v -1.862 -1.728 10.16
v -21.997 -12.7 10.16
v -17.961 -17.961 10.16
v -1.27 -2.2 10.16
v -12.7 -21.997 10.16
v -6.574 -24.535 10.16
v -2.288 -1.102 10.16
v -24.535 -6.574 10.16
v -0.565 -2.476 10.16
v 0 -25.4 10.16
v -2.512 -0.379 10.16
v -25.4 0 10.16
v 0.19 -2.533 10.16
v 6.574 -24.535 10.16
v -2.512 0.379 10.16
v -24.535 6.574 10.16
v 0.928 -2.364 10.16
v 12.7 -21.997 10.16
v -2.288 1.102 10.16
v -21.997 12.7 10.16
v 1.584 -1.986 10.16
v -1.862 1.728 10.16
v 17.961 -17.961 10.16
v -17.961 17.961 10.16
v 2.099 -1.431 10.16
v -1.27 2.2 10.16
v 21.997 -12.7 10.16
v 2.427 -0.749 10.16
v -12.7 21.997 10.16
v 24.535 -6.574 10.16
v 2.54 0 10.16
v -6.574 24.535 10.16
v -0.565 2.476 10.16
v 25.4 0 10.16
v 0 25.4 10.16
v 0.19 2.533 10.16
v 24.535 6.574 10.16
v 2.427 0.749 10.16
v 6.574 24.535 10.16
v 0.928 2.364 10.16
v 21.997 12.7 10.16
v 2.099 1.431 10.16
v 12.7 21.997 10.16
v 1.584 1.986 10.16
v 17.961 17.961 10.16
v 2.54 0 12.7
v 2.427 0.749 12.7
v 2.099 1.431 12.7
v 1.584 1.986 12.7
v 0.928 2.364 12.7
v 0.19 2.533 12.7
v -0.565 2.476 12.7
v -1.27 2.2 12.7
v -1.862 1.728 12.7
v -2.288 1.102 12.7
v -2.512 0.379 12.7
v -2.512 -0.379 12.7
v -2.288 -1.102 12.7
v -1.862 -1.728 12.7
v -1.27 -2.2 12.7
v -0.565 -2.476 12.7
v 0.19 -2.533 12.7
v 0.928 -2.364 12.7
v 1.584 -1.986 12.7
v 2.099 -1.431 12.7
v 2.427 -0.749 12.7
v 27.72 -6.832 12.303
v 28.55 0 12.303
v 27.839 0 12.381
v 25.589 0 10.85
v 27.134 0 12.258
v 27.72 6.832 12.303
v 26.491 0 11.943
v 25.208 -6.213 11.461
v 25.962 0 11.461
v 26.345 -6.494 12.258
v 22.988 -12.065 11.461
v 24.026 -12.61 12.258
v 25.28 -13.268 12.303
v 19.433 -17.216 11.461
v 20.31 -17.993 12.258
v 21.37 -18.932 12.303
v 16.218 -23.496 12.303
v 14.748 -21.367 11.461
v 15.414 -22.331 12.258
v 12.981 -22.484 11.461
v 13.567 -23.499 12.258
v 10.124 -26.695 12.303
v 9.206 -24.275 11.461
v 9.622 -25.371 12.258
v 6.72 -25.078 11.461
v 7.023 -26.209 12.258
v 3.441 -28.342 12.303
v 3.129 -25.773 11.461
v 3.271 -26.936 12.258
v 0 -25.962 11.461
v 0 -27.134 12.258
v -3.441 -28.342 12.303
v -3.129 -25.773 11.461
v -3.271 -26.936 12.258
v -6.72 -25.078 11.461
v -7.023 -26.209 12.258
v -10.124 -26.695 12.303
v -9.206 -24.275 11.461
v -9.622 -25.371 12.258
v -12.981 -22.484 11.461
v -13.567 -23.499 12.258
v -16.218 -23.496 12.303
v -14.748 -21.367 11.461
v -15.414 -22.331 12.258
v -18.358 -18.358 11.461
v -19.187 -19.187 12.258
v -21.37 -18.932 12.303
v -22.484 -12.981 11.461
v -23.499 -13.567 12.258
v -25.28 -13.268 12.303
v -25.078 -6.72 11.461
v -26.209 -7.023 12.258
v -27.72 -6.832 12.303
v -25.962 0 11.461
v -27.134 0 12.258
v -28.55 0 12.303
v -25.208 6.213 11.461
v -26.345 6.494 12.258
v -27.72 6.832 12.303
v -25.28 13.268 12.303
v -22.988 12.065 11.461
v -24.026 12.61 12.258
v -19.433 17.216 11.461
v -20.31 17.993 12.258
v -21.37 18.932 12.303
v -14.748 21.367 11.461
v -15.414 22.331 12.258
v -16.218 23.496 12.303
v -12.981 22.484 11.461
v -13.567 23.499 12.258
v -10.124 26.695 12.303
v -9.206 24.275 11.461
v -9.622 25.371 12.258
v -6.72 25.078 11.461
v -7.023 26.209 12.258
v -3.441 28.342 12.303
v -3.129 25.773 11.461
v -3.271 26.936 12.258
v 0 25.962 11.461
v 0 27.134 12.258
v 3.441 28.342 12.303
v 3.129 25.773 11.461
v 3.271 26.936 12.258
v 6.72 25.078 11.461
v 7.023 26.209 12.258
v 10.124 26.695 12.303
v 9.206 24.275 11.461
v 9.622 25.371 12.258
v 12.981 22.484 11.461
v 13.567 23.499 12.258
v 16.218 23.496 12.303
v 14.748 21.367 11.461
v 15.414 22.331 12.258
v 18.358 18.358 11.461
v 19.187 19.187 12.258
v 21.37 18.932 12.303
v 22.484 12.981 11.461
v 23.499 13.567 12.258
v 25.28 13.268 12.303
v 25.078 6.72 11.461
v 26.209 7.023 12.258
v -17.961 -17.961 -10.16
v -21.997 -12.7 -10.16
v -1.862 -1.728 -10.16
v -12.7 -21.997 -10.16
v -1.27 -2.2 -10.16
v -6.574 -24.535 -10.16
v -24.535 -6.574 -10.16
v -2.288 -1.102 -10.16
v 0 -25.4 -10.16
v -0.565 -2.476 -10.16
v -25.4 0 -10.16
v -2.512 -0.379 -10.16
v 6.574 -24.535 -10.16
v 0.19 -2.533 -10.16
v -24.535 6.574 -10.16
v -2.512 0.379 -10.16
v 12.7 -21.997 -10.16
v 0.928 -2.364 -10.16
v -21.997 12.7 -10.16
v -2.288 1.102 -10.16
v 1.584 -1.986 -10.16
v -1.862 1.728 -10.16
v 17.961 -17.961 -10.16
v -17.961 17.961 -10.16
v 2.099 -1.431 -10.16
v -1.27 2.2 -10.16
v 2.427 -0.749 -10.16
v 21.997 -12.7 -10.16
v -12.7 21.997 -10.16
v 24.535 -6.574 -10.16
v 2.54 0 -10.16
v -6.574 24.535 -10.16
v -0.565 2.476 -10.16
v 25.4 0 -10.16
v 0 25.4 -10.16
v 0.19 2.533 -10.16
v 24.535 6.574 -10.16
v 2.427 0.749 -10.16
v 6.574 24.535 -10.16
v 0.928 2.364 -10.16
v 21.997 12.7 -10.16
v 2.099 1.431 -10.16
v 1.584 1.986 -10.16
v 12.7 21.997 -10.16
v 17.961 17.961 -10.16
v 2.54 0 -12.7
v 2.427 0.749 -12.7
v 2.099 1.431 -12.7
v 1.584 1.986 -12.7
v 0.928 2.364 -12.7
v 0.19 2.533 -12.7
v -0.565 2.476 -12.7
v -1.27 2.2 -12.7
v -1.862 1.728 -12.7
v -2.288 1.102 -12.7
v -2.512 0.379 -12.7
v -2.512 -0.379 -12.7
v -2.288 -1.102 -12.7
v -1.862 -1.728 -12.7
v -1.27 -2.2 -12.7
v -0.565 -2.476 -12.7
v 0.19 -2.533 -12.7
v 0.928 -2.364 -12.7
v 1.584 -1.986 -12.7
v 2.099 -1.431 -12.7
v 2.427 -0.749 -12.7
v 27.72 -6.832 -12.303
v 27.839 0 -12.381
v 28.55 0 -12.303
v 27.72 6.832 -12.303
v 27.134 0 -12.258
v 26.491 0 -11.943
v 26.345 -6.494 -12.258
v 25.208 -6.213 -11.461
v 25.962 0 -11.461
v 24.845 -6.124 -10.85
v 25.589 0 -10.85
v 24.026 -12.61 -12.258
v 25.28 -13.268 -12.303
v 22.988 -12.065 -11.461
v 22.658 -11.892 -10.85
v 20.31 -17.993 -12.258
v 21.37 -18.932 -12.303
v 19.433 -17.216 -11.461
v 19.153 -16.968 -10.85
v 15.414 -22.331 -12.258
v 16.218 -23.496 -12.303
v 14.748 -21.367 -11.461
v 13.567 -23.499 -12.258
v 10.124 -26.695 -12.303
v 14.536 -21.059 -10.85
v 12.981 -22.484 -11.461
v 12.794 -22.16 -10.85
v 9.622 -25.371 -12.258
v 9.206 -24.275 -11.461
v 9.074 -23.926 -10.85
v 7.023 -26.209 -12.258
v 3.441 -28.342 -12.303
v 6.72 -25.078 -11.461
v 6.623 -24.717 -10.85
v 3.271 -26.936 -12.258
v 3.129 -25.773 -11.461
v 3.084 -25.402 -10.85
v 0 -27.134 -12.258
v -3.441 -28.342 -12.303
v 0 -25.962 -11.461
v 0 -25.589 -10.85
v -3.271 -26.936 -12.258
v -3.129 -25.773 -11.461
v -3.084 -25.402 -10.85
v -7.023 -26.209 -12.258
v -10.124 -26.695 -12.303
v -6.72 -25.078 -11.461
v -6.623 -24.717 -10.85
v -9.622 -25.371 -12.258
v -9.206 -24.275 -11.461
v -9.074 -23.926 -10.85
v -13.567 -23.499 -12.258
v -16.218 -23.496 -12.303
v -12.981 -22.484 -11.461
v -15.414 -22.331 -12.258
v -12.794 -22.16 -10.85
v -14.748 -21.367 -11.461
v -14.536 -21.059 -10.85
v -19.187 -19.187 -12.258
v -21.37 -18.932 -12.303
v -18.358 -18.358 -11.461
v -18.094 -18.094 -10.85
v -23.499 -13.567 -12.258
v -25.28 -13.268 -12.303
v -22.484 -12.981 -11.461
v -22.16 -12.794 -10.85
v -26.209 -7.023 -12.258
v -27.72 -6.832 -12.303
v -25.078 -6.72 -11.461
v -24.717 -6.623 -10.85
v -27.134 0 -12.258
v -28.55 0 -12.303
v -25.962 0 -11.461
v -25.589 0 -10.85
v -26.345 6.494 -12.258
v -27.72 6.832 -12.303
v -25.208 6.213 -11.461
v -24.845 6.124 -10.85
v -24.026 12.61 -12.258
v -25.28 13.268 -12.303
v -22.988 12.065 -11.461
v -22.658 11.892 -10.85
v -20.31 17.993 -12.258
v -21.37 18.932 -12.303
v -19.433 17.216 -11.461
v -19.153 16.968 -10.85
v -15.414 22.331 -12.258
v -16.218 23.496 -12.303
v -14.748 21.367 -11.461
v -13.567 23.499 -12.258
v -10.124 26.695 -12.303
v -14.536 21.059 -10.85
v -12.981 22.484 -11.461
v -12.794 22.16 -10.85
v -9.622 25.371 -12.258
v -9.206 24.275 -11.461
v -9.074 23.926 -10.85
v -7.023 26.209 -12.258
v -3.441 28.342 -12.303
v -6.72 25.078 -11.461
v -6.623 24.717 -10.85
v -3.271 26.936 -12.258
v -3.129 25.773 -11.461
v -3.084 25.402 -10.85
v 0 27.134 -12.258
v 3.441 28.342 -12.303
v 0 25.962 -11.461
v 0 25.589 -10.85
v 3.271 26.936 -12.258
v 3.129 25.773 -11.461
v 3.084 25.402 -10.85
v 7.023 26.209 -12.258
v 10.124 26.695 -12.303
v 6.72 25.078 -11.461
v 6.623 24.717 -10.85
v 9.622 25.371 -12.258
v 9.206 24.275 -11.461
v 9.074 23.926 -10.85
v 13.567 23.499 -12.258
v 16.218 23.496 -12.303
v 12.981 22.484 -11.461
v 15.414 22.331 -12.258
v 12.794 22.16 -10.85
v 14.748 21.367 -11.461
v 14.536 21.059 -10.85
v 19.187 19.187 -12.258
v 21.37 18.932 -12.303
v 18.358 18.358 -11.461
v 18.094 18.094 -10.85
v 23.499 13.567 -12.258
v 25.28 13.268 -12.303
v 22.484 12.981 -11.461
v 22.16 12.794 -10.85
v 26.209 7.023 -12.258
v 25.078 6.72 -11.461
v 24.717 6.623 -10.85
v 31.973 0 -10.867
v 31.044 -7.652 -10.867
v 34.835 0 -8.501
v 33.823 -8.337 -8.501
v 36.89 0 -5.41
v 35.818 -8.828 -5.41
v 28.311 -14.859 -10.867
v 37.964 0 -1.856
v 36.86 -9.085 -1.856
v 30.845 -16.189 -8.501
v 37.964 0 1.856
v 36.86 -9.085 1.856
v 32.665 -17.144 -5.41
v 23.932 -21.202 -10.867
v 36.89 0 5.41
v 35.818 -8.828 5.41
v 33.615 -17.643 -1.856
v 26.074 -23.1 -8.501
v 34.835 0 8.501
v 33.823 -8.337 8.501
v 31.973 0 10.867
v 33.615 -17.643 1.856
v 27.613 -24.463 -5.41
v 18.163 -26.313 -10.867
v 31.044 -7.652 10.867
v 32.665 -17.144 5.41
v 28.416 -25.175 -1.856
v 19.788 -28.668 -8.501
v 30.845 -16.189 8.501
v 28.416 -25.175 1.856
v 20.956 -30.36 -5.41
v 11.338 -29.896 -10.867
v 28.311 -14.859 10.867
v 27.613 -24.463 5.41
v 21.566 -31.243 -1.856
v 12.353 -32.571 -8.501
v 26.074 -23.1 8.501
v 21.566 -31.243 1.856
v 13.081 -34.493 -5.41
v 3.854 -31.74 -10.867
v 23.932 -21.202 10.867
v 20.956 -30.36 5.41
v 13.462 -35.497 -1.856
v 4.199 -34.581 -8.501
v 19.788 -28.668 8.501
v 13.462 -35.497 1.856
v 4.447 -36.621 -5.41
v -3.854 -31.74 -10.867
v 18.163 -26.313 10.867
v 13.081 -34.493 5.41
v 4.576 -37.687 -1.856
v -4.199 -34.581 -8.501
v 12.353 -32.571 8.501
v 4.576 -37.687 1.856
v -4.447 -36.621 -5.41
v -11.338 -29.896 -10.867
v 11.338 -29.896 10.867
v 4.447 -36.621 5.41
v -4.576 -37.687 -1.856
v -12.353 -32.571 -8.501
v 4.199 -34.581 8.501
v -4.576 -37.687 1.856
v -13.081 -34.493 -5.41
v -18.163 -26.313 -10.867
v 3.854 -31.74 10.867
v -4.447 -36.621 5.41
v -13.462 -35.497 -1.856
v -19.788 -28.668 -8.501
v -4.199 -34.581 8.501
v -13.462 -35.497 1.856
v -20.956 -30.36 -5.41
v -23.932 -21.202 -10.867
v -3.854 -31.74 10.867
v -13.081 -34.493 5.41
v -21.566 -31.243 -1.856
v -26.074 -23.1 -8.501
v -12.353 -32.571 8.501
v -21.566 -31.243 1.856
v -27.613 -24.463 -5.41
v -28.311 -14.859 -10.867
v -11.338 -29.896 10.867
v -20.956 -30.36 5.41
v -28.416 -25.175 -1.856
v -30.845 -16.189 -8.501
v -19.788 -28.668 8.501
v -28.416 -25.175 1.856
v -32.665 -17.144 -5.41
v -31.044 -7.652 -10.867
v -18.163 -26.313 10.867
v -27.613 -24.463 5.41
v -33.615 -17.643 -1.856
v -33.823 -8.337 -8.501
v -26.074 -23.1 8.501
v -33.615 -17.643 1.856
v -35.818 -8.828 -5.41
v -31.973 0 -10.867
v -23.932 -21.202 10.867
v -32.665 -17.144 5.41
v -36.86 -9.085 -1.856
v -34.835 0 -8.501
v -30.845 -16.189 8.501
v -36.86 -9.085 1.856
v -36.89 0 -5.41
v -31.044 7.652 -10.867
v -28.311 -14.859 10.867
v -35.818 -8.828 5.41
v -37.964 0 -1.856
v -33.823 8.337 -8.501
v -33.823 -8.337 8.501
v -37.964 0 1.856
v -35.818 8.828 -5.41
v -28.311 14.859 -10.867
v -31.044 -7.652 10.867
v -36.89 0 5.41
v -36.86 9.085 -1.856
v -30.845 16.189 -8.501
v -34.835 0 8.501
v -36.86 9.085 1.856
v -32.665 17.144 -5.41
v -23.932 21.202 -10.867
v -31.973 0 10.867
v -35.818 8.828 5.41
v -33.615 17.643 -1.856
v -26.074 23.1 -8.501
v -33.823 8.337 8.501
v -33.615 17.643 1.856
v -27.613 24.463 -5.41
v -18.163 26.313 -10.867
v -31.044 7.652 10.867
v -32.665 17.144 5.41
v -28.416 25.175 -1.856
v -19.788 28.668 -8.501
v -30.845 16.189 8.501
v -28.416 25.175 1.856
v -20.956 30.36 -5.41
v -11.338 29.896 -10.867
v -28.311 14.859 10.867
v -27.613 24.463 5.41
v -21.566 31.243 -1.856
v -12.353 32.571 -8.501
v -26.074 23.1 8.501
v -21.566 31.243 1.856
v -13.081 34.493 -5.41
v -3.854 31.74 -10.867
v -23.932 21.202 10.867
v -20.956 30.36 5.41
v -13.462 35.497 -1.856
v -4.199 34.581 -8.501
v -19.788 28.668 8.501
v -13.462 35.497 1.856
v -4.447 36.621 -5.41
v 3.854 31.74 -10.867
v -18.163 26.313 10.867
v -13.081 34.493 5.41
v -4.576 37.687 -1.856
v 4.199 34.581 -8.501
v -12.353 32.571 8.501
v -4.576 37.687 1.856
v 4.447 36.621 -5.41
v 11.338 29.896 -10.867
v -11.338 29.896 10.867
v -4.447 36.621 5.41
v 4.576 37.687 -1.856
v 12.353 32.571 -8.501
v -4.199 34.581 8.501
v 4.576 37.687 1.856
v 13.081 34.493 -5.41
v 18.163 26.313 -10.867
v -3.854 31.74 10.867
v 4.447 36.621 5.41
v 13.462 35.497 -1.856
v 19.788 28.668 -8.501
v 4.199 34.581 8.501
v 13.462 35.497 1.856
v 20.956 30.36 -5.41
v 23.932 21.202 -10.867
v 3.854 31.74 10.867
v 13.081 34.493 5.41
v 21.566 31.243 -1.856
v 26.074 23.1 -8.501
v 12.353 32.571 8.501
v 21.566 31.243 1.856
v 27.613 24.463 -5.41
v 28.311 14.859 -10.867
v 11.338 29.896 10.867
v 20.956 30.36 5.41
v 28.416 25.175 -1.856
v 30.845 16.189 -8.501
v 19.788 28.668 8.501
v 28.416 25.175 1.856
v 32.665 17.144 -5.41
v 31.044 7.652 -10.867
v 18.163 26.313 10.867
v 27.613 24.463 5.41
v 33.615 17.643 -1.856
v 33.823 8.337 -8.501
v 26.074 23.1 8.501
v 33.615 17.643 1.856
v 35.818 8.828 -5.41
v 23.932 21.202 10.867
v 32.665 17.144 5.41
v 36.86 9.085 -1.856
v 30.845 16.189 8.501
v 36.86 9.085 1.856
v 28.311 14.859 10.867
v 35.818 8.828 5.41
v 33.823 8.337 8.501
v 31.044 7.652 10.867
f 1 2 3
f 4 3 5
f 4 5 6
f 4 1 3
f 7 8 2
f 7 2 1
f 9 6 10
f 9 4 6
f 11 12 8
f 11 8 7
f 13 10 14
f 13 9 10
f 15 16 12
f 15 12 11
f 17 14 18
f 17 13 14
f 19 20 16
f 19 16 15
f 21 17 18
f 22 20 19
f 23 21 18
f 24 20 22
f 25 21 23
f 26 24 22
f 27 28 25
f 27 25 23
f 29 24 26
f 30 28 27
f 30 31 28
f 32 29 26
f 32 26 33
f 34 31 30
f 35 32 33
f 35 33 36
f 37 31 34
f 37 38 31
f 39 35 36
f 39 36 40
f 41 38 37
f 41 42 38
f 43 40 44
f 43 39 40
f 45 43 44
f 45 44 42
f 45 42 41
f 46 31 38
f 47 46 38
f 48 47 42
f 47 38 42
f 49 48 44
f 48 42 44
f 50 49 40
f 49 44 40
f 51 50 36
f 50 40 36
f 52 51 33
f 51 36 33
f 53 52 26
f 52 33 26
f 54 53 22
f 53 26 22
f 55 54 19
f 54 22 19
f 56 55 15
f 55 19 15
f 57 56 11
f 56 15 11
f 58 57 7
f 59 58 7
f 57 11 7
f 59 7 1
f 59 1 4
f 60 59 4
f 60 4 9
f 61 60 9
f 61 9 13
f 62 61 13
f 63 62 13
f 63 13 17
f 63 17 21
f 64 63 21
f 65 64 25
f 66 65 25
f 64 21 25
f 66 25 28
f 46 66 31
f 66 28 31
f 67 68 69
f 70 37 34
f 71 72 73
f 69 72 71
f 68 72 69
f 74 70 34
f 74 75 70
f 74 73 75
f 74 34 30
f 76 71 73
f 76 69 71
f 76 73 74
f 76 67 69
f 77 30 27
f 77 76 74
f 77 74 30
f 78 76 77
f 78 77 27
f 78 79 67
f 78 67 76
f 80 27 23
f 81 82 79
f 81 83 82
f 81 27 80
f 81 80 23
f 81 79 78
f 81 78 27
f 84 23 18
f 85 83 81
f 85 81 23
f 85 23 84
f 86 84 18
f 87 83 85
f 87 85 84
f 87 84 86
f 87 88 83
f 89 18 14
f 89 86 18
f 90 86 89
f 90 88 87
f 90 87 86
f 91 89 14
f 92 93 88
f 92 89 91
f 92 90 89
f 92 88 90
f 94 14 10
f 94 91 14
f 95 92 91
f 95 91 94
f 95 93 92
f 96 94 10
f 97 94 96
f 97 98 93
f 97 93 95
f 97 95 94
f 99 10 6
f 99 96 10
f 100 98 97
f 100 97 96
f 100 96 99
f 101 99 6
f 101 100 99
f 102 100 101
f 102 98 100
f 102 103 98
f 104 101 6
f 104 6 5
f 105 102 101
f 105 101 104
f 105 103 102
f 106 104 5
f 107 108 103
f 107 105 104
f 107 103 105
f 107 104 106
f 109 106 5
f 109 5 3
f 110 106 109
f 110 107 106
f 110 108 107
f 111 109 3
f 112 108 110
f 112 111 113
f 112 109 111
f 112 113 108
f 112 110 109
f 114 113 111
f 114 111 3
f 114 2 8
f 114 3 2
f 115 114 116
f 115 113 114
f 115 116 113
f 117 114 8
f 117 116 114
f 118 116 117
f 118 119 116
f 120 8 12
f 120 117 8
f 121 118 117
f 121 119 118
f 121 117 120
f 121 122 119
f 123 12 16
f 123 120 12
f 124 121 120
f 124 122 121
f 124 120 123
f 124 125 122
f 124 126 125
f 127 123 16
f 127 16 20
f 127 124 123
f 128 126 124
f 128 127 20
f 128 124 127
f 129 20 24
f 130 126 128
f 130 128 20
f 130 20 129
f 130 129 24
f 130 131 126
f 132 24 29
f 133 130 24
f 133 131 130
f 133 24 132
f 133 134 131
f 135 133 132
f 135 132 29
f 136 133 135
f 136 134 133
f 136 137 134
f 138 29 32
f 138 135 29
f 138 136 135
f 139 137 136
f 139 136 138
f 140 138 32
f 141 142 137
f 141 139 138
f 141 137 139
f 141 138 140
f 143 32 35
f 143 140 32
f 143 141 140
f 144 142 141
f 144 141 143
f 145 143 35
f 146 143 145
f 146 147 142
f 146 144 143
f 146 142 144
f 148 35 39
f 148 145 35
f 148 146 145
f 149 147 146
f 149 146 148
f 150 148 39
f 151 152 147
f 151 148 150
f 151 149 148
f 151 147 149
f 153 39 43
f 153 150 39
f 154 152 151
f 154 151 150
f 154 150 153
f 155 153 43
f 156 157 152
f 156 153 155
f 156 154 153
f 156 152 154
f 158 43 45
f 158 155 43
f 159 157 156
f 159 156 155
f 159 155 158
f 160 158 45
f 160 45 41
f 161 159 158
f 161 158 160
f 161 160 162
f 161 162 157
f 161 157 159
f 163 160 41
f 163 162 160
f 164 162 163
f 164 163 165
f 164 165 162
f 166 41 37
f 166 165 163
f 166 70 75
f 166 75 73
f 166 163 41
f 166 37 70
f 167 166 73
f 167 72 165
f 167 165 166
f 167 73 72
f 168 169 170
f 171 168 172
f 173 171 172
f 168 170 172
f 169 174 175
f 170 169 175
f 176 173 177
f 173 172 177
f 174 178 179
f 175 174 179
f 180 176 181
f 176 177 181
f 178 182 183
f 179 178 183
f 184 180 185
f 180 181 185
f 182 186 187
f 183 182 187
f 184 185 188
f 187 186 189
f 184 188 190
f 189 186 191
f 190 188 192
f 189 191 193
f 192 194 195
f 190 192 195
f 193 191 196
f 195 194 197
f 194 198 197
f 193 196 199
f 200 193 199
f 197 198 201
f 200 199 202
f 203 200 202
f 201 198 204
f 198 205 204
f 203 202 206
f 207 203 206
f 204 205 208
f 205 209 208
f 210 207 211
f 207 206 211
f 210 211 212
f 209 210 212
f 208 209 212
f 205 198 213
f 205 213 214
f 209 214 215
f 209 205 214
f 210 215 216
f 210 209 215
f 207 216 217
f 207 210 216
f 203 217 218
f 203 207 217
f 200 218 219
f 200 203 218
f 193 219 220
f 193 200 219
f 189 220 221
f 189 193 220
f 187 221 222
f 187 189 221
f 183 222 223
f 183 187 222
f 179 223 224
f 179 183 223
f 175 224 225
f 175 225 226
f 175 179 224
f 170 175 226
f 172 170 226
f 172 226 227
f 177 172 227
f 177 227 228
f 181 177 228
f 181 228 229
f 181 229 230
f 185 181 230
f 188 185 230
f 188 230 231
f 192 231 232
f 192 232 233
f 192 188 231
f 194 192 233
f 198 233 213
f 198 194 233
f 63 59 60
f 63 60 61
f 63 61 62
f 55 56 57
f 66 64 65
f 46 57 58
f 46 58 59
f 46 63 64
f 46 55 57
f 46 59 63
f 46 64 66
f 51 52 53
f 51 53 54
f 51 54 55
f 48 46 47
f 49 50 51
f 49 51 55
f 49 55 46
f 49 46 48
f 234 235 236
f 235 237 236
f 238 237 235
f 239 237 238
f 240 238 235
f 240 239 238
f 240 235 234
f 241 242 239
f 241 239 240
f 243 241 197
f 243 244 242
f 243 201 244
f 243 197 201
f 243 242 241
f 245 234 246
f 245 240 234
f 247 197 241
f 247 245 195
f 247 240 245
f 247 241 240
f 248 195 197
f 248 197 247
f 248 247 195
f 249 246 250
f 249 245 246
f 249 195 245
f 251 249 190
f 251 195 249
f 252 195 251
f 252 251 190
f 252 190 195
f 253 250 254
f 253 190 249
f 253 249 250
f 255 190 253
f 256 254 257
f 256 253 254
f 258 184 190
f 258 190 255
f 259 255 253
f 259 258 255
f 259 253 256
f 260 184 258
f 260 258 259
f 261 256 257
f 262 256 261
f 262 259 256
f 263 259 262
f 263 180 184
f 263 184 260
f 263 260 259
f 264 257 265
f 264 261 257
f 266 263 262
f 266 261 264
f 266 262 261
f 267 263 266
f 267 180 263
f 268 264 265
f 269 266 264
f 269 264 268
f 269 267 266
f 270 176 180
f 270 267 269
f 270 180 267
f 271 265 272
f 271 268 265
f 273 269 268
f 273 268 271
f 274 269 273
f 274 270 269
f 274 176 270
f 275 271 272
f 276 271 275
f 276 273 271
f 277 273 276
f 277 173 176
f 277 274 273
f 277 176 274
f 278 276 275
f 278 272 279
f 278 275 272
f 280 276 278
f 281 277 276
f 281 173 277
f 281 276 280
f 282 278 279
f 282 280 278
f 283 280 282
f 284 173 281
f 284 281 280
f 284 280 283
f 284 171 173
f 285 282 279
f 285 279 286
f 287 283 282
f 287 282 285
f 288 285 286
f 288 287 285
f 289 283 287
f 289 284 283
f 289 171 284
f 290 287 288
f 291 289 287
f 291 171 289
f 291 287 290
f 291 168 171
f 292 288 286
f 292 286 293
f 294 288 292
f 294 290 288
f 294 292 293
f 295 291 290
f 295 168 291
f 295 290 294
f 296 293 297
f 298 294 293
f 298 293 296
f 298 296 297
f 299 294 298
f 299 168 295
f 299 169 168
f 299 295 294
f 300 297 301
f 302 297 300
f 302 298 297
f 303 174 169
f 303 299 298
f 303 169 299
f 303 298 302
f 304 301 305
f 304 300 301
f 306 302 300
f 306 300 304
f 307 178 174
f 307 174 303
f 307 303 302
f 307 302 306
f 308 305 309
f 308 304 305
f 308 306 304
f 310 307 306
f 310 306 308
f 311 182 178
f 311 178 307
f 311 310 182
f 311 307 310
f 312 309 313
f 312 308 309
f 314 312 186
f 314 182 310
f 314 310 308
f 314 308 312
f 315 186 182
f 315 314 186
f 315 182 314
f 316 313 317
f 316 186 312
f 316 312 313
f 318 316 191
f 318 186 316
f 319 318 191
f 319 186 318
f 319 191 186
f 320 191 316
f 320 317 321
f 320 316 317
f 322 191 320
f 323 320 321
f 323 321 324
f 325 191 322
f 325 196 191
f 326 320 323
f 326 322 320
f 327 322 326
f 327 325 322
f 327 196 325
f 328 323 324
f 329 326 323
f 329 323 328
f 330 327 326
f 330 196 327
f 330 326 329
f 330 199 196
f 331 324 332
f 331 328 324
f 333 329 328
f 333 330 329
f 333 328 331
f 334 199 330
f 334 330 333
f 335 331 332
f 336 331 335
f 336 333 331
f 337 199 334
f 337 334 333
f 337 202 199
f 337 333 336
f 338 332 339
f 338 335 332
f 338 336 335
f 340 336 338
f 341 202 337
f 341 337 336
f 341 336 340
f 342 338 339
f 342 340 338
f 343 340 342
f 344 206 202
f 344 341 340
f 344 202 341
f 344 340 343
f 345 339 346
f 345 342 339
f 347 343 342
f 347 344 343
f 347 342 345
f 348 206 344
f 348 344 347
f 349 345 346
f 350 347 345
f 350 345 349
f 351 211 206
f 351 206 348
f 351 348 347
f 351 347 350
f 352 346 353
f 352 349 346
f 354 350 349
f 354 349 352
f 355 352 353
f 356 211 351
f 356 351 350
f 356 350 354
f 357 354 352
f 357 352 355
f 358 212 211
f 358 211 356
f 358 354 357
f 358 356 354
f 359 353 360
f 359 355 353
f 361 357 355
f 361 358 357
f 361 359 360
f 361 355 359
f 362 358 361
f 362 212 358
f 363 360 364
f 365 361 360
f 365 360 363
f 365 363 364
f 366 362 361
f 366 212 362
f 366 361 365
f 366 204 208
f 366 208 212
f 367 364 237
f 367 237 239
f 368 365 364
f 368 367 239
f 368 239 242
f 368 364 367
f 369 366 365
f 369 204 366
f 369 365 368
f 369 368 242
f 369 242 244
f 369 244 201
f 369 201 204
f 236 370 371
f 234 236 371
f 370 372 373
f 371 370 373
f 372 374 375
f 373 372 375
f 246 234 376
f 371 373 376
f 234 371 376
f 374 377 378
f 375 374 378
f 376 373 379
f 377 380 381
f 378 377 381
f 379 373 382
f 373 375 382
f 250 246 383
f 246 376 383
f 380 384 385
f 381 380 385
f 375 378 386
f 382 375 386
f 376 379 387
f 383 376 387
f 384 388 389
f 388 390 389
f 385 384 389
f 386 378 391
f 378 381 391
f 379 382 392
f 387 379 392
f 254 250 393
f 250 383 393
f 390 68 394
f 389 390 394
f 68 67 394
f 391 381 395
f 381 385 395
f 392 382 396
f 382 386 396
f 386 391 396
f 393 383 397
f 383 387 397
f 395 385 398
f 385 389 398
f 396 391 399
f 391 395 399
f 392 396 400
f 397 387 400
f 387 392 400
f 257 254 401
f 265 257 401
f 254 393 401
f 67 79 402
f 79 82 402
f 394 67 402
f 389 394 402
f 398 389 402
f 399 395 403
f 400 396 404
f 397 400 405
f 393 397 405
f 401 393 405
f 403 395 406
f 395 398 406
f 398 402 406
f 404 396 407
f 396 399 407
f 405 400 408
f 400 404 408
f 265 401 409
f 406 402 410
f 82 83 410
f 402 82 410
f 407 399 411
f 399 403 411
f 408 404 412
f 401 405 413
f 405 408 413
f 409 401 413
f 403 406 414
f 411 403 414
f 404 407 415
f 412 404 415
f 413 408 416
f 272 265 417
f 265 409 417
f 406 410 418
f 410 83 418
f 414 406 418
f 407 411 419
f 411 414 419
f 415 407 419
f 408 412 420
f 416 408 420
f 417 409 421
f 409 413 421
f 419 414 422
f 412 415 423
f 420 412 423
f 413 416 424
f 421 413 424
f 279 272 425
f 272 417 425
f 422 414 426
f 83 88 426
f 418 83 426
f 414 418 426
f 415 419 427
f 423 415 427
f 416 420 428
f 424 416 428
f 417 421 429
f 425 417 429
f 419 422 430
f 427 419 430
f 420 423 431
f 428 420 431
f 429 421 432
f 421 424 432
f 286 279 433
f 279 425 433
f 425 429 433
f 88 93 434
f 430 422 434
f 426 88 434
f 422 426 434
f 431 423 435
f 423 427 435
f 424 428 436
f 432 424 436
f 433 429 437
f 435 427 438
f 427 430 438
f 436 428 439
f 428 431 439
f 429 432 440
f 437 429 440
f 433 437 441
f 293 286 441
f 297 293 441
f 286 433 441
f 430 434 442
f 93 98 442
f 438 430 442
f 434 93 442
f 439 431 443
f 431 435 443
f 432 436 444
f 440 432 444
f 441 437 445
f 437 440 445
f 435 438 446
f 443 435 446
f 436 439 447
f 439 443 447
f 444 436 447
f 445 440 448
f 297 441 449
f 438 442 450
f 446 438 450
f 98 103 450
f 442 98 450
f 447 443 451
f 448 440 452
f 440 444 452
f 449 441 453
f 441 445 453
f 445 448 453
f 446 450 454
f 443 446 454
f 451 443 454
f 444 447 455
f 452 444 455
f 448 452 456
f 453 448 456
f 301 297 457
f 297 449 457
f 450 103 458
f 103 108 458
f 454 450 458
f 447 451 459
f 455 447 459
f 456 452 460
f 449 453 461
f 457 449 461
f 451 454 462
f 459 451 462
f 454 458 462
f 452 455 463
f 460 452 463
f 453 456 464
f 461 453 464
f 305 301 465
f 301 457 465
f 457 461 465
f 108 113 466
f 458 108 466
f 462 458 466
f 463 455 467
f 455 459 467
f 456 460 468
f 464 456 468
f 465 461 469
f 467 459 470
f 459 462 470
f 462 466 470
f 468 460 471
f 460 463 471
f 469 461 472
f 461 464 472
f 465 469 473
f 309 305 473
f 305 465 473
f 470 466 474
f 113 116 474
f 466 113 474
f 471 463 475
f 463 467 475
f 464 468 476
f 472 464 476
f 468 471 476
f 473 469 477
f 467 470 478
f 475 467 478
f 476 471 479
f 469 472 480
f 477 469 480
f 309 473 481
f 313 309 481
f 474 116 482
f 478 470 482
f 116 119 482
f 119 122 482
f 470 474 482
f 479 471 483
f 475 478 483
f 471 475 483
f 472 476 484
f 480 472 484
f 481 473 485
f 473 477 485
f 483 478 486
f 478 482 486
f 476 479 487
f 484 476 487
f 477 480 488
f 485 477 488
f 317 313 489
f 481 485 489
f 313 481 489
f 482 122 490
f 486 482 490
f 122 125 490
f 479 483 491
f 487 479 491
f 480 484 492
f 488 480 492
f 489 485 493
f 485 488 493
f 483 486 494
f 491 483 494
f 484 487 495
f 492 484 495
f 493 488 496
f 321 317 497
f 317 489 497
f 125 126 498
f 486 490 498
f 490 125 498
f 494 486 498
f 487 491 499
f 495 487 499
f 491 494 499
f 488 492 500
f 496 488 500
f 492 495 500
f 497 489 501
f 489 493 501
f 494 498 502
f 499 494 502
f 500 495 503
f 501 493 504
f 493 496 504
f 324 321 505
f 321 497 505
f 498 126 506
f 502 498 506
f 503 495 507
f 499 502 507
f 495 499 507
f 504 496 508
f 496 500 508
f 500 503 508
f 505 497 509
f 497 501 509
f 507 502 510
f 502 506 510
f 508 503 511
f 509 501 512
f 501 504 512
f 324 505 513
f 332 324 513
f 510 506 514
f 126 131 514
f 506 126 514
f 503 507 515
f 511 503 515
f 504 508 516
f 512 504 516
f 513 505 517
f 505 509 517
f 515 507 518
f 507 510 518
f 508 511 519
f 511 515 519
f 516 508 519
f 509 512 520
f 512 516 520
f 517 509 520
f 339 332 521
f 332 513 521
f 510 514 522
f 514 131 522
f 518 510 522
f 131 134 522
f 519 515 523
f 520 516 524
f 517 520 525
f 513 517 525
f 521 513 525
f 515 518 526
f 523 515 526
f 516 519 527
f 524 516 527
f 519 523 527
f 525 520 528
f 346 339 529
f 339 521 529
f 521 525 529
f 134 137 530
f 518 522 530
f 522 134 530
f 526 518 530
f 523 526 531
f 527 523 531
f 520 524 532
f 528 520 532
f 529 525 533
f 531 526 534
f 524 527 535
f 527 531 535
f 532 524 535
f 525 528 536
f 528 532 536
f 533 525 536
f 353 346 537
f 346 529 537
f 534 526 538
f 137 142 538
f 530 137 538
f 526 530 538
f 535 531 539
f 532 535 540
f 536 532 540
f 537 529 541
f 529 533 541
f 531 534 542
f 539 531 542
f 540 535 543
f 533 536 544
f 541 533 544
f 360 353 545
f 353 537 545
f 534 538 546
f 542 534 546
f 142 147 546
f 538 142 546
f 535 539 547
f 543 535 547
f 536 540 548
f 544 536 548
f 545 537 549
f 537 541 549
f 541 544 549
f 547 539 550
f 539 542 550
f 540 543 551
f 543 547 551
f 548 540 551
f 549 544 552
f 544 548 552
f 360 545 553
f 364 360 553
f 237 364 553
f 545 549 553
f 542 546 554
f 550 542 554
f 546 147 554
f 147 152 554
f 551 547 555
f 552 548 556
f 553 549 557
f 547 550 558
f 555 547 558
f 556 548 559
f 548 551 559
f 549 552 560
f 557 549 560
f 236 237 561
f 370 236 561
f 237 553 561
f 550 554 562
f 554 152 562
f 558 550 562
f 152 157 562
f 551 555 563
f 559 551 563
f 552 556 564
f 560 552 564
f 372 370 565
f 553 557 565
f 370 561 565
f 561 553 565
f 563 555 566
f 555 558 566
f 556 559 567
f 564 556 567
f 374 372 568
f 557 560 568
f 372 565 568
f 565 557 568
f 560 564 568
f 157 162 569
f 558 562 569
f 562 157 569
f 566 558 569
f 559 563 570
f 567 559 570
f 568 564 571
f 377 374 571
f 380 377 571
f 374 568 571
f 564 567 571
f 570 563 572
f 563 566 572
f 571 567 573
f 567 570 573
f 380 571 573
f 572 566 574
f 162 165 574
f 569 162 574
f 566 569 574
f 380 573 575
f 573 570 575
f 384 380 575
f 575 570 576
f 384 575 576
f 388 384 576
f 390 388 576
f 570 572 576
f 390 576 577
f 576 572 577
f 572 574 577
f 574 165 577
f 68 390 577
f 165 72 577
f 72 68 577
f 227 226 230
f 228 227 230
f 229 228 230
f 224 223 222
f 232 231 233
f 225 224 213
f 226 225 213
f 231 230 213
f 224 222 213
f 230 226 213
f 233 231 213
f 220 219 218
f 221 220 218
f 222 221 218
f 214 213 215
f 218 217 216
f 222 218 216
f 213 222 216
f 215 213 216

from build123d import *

# Parameters (mm, degrees)
BOSS_EXTRUDE1_DEPTH      = 10.16
BOSS_EXTRUDE1_DEPTH_BACK = 10.16
SKETCH4_R                = 25.4
SKETCH5_R                = 2.54
BOSS_EXTRUDE2_DEPTH      = 2.54
FILLET1_R                = 2.54


with BuildPart() as part:
    # Sketch1 → Revolve1 (revolve)
    with BuildSketch(Plane(origin=(0, 0, 0), x_dir=(0, 0, -1), z_dir=(1, 0, 0)), mode=Mode.PRIVATE) as revolve1_sk:
        with BuildLine():
            Line((-12.7, 25.4), (12.7, 25.4))
            ThreePointArc((12.7, 25.4), (0, 38.1), (-12.7, 25.4))
        make_face()
    revolve(revolve1_sk.sketch.rotate(Axis((0, 0, 0), (0, 0, -1)), 90), axis=Axis((0, 0, 0), (0, 0, -1)))

    # Sketch4 → Boss-Extrude1 (add, two sides: drawn at the far end of the back side and taken through both)
    with BuildSketch(Plane.XY.offset(-BOSS_EXTRUDE1_DEPTH_BACK)):
        Circle(SKETCH4_R)
    extrude(amount=BOSS_EXTRUDE1_DEPTH + BOSS_EXTRUDE1_DEPTH_BACK)

    # Sketch5 → Boss-Extrude2 (add)
    with BuildSketch(Plane.XY.offset(10.16)):
        Circle(SKETCH5_R)
    boss_extrude2 = extrude(amount=BOSS_EXTRUDE2_DEPTH)

    # Mirror1: Boss-Extrude2 across plane
    add(boss_extrude2.mirror(Plane.XY))

    # Fillet1
    # the kernel refuses this fillet: 2.54 mm, written as the material it takes off along each edge
    with BuildSketch(Plane(origin=(0, 0, -12.7), x_dir=(1, 0, 0), z_dir=(0, 1, 0))) as fillet1_piece_1:
        with BuildLine():
            CenterArc((27.920078124, -2.8575), FILLET1_R, 75.638488437, 97.180755781)
            Line((25.4, -2.54), (25.349598438, -2.53365))
            ThreePointArc((25.349598438, -2.53365), (25.3492, -1.27), (25.3492, 0))
            Line((25.3492, 0), (25.4, 0.0508))
            ThreePointArc((25.4, 0.0508), (26.99385, -0.049207819), (28.562698045, -0.3476625))
            Line((28.562698045, -0.3476625), (28.550097655, -0.396875))
        make_face()
    revolve(axis=Axis((0, 0, -12.7), (0, 0, -1)), mode=Mode.SUBTRACT)
    with BuildSketch(Plane(origin=(0, 0, 12.7), x_dir=(1, 0, 0), z_dir=(0, 1, 0))) as fillet1_piece_2:
        with BuildLine():
            CenterArc((27.920078124, 2.8575), FILLET1_R, 187.180755781, 97.180755781)
            Line((28.550097655, 0.396875), (28.562698045, 0.3476625))
            ThreePointArc((28.562698045, 0.3476625), (26.99385, 0.049207819), (25.4, -0.0508))
            Line((25.4, -0.0508), (25.3492, 0))
            ThreePointArc((25.3492, 0), (25.3492, 1.27), (25.349598438, 2.53365))
            Line((25.349598438, 2.53365), (25.4, 2.54))
        make_face()
    revolve(axis=Axis((0, 0, 12.7), (0, 0, -1)), mode=Mode.SUBTRACT)


solid = part.part
